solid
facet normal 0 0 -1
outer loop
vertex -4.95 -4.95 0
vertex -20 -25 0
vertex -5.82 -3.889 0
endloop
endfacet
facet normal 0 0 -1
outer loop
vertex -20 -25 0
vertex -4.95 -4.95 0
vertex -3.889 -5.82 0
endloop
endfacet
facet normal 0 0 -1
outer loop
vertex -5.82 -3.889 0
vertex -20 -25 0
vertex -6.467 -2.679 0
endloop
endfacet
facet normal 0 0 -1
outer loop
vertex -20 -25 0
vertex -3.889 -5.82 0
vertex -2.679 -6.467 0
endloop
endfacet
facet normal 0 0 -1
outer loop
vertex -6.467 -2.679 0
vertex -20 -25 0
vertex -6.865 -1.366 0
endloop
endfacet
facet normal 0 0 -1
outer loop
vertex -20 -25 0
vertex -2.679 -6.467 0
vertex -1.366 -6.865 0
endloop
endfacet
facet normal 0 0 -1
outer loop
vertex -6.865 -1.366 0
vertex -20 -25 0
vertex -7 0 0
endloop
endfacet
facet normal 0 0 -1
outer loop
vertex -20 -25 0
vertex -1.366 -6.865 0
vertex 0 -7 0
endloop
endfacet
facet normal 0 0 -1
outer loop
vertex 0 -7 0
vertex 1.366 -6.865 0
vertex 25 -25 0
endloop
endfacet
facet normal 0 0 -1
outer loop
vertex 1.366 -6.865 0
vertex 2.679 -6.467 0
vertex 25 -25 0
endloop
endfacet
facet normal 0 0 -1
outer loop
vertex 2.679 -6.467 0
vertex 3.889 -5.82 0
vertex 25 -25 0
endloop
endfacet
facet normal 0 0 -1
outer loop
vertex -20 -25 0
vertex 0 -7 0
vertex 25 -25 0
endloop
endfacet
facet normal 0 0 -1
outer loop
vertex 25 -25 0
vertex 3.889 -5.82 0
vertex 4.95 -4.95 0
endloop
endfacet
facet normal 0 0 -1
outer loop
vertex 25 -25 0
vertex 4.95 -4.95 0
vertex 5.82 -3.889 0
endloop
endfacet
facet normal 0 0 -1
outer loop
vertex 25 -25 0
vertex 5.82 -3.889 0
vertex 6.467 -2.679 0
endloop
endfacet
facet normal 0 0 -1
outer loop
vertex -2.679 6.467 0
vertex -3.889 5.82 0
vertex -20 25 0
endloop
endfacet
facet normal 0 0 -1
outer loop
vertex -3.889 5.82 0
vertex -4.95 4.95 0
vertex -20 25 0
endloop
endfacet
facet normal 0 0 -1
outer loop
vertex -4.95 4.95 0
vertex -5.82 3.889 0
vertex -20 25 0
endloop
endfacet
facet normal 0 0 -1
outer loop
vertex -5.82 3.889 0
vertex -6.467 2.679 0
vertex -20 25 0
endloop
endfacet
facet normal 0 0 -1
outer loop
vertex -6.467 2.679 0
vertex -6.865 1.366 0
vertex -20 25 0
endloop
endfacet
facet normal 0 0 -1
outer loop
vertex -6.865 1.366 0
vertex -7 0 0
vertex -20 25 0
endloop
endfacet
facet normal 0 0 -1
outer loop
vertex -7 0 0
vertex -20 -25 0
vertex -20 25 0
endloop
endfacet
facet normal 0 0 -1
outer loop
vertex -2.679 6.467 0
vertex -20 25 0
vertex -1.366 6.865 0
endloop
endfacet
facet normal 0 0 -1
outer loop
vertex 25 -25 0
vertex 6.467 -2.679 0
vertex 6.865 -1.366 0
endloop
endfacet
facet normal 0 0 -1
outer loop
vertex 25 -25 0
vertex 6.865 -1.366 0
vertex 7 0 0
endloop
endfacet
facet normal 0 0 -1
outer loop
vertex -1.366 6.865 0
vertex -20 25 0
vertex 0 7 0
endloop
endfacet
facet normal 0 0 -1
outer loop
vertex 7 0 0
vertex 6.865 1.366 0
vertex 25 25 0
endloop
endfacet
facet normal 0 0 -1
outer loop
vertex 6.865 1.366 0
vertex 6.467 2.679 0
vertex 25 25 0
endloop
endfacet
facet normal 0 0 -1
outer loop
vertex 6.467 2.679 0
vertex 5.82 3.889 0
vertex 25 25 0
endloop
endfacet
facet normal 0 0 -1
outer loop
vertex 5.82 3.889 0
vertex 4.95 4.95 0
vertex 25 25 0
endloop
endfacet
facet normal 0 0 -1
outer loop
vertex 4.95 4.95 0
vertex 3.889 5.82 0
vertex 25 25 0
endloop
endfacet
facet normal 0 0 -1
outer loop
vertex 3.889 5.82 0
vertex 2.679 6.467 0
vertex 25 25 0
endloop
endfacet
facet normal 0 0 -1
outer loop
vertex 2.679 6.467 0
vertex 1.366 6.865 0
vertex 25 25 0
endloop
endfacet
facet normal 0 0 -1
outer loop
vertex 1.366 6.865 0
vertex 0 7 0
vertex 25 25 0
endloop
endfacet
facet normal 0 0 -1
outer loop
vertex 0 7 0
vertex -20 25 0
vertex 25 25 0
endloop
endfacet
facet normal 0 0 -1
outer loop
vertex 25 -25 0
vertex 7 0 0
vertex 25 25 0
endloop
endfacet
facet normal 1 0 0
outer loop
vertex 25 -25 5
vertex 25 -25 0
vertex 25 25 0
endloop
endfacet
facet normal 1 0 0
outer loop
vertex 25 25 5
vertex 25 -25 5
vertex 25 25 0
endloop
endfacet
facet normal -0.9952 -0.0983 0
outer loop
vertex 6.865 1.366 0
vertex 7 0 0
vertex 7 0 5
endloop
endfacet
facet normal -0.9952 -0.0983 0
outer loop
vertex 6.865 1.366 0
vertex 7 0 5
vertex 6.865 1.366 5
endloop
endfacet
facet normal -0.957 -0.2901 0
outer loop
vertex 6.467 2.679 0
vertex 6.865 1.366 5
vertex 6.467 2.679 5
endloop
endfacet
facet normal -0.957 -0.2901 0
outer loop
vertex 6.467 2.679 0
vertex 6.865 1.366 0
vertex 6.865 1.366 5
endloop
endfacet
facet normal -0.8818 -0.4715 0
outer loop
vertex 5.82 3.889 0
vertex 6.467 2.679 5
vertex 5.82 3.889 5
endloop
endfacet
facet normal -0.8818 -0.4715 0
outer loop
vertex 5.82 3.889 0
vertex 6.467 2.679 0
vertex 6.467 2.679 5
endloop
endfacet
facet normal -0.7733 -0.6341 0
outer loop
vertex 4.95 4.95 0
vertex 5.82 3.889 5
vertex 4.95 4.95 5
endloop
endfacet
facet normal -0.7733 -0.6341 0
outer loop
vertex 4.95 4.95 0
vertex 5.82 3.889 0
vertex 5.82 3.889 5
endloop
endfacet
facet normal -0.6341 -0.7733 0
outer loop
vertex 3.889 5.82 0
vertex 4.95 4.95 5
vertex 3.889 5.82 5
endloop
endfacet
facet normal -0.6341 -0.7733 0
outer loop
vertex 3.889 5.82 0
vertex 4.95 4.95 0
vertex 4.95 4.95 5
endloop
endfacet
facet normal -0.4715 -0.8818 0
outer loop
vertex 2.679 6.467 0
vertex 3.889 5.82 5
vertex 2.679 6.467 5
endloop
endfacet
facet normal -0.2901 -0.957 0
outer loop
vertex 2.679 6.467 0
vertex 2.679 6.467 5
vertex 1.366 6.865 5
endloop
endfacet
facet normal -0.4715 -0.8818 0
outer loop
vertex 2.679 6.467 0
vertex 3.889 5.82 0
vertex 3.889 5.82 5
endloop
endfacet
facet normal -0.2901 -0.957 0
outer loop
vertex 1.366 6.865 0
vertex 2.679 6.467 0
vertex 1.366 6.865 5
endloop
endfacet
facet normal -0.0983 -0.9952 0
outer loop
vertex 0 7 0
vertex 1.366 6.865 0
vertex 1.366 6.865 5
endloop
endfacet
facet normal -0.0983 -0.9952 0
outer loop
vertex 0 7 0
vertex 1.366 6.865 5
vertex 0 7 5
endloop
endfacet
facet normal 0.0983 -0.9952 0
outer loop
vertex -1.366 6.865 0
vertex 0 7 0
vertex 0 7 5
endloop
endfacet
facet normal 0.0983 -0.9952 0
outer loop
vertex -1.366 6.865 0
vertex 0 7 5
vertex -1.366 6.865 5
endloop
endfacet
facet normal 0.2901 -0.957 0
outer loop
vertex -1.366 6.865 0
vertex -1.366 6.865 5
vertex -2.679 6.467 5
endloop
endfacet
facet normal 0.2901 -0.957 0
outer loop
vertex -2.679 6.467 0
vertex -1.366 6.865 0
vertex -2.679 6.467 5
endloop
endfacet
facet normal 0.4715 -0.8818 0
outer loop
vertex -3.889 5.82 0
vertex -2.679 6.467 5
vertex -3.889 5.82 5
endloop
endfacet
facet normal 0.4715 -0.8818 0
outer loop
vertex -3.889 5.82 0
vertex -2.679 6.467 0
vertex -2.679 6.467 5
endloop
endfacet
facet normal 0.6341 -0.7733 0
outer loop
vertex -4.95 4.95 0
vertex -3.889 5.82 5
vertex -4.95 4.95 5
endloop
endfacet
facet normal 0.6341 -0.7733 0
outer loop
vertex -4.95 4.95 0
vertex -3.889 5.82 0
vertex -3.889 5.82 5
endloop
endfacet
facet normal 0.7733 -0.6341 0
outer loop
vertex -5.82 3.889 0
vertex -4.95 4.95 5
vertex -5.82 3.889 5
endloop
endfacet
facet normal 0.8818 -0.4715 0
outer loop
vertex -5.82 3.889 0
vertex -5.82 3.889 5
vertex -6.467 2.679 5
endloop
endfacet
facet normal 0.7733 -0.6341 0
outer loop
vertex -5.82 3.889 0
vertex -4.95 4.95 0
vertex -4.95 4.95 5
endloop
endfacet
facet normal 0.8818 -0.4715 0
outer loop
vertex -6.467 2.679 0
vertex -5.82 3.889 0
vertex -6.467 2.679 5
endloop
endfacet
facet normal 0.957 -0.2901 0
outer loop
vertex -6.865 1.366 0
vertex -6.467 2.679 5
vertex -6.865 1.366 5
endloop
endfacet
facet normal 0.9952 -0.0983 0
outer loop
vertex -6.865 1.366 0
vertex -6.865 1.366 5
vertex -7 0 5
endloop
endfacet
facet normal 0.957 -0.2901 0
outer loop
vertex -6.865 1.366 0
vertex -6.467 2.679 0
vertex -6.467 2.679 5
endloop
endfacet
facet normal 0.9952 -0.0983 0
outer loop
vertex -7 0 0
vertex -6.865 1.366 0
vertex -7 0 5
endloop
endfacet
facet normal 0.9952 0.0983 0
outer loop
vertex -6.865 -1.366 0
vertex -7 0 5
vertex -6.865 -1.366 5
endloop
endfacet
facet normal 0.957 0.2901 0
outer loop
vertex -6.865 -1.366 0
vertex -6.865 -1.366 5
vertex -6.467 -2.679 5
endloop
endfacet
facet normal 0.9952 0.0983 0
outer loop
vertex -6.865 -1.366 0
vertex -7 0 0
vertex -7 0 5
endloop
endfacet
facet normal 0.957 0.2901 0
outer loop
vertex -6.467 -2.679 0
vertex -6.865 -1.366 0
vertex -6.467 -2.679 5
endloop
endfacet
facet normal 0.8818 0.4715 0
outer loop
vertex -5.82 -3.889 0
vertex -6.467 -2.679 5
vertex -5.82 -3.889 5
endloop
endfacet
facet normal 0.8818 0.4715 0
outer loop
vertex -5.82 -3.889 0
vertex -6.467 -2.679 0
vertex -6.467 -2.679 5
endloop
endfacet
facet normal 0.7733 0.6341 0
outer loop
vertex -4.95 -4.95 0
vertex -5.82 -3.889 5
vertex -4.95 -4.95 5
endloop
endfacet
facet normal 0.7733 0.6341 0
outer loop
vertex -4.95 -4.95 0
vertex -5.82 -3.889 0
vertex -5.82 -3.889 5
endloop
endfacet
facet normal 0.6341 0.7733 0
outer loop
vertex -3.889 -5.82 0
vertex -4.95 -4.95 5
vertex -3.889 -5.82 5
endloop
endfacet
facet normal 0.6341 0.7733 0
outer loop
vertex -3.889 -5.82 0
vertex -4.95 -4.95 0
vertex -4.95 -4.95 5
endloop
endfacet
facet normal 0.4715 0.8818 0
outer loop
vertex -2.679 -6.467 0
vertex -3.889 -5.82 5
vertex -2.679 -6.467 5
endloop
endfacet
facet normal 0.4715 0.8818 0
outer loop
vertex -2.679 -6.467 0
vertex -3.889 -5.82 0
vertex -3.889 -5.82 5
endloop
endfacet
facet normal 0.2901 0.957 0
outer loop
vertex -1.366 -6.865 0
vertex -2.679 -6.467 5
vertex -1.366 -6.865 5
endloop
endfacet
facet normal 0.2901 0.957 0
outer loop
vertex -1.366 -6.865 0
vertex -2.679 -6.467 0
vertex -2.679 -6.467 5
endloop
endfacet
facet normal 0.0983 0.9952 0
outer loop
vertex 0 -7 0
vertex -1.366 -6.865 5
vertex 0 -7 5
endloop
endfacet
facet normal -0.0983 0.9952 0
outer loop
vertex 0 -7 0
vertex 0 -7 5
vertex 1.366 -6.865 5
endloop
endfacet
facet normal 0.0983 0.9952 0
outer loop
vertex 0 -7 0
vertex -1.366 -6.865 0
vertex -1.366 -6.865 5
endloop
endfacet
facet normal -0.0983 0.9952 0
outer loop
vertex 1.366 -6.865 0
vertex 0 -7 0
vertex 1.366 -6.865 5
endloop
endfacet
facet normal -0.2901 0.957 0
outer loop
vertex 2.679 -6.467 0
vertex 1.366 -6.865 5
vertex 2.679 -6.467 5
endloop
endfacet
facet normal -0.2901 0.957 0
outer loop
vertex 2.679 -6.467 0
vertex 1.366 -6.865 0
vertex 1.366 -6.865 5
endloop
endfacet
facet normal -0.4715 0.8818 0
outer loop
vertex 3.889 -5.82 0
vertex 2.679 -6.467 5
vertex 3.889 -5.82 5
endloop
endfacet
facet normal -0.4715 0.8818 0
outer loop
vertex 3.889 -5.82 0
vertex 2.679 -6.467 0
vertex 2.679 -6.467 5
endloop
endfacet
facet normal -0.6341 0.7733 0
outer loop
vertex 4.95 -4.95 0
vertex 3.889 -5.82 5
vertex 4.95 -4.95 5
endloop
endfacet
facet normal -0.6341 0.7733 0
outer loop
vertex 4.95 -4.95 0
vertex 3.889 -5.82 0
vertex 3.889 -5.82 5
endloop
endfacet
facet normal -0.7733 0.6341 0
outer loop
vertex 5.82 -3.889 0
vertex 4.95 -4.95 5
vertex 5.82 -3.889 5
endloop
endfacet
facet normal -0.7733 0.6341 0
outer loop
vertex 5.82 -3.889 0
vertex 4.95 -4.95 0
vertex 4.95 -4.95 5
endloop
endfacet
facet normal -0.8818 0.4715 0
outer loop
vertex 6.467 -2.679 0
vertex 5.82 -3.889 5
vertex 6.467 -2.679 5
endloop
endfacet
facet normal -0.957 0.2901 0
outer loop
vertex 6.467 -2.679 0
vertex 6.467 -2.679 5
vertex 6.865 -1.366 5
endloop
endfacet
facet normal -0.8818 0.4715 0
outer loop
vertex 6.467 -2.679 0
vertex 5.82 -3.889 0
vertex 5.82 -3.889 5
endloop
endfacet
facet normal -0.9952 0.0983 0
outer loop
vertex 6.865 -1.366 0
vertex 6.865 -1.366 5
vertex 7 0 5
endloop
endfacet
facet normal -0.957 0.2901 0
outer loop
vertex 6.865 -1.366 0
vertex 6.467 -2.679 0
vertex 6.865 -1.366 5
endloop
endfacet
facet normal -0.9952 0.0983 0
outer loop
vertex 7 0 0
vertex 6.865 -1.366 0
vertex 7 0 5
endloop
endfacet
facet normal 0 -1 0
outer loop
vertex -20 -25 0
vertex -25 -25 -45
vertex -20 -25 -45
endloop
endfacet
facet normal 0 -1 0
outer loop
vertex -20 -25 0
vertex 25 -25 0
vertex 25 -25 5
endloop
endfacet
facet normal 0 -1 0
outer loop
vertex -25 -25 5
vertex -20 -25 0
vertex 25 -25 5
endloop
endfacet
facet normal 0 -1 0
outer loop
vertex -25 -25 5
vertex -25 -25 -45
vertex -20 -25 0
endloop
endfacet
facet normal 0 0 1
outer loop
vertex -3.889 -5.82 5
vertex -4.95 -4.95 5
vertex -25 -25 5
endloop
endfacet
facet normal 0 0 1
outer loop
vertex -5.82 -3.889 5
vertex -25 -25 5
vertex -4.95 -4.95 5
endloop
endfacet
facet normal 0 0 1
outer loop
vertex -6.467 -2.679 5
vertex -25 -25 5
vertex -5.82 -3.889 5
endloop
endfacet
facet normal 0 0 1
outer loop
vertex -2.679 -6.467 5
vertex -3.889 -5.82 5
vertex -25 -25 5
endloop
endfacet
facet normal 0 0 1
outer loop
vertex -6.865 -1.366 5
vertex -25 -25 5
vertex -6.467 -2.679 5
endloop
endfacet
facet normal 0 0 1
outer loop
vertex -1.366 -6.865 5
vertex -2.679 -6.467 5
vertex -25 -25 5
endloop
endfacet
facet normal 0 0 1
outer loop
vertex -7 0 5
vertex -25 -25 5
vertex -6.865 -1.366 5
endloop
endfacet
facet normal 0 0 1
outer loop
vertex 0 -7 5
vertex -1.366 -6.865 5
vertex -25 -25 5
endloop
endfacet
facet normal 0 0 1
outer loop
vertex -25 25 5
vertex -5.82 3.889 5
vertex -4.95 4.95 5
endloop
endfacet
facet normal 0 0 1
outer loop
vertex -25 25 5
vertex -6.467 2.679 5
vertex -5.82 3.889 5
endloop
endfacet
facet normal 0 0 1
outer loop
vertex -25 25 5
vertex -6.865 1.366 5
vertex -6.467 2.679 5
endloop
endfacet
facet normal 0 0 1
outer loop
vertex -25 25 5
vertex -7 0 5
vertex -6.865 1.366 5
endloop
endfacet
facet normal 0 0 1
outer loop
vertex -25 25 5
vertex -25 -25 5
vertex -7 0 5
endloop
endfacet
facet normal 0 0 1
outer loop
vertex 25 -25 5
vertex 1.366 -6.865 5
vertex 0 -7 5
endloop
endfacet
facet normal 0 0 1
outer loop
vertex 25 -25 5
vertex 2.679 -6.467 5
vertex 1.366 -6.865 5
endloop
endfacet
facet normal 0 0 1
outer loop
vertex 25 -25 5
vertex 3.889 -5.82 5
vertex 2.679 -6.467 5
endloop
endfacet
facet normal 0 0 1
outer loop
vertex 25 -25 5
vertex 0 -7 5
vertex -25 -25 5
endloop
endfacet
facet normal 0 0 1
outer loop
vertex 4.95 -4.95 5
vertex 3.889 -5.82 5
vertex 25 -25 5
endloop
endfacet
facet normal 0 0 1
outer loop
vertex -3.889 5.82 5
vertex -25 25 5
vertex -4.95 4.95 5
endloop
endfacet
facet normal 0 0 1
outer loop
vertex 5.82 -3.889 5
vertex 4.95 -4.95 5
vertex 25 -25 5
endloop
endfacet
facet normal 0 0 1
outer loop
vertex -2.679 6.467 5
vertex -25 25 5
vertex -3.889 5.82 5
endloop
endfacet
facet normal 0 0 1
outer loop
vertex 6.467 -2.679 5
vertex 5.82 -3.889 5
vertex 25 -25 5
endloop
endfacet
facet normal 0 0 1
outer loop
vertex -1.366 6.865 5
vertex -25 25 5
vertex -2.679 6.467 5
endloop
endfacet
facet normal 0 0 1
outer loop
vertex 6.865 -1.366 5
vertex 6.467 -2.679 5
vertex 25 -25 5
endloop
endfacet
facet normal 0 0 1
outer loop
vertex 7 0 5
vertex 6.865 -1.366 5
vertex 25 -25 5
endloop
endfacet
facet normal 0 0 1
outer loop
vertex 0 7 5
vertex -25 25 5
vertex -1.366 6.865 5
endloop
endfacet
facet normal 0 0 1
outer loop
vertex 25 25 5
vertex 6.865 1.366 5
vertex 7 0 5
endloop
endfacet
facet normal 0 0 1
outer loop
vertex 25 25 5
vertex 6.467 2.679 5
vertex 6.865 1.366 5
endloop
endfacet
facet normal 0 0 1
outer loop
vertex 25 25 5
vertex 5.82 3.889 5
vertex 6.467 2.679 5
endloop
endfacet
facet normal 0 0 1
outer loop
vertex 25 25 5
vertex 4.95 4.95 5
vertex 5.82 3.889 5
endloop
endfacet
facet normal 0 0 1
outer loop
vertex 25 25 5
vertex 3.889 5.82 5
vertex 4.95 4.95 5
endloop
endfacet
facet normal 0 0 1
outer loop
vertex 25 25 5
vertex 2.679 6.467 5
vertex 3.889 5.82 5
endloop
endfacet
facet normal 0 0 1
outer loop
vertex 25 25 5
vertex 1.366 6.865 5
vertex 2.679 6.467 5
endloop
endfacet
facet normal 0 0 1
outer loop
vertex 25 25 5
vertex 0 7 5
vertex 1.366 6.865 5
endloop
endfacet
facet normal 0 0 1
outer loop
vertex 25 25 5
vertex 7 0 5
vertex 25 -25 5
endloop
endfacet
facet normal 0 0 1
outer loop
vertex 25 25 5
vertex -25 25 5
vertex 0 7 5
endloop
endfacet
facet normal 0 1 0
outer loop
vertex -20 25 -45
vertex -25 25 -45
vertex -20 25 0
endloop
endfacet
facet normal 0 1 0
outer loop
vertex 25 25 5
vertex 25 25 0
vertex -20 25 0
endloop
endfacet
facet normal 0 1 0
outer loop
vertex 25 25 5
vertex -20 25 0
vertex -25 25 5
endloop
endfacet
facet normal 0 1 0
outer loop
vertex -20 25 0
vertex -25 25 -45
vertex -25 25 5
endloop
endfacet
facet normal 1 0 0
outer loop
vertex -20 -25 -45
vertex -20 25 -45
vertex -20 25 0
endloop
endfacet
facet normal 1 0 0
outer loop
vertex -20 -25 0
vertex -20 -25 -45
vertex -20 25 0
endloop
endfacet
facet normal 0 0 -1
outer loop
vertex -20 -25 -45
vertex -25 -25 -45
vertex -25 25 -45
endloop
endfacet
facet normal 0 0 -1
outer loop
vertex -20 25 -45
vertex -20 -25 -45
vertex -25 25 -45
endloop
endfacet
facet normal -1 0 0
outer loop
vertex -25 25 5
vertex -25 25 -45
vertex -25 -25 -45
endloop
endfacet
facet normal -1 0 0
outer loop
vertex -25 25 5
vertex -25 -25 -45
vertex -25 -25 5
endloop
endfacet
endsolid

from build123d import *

# Parameters (mm, degrees)
SKETCH_1_W      = 50
SKETCH_1_H      = 50
SKETCH_1_R      = 7
EXTRUDE_1_DEPTH = 5
SKETCH_2_W      = 50
SKETCH_2_H      = 50
EXTRUDE_2_DEPTH = 5


with BuildPart() as part:
    # 草图1 → 凸台-拉伸1 (new body)
    with BuildSketch(Plane.XY):
        Rectangle(SKETCH_1_W, SKETCH_1_H)
        Circle(SKETCH_1_R, mode=Mode.SUBTRACT)
    extrude(amount=EXTRUDE_1_DEPTH)

    # 草图2 → 凸台-拉伸2 (add)
    with BuildSketch(Plane.ZY.offset(25)):
        with Locations((-20, 0)):
            Rectangle(SKETCH_2_W, SKETCH_2_H)
    extrude(amount=-EXTRUDE_2_DEPTH)


solid = part.part
